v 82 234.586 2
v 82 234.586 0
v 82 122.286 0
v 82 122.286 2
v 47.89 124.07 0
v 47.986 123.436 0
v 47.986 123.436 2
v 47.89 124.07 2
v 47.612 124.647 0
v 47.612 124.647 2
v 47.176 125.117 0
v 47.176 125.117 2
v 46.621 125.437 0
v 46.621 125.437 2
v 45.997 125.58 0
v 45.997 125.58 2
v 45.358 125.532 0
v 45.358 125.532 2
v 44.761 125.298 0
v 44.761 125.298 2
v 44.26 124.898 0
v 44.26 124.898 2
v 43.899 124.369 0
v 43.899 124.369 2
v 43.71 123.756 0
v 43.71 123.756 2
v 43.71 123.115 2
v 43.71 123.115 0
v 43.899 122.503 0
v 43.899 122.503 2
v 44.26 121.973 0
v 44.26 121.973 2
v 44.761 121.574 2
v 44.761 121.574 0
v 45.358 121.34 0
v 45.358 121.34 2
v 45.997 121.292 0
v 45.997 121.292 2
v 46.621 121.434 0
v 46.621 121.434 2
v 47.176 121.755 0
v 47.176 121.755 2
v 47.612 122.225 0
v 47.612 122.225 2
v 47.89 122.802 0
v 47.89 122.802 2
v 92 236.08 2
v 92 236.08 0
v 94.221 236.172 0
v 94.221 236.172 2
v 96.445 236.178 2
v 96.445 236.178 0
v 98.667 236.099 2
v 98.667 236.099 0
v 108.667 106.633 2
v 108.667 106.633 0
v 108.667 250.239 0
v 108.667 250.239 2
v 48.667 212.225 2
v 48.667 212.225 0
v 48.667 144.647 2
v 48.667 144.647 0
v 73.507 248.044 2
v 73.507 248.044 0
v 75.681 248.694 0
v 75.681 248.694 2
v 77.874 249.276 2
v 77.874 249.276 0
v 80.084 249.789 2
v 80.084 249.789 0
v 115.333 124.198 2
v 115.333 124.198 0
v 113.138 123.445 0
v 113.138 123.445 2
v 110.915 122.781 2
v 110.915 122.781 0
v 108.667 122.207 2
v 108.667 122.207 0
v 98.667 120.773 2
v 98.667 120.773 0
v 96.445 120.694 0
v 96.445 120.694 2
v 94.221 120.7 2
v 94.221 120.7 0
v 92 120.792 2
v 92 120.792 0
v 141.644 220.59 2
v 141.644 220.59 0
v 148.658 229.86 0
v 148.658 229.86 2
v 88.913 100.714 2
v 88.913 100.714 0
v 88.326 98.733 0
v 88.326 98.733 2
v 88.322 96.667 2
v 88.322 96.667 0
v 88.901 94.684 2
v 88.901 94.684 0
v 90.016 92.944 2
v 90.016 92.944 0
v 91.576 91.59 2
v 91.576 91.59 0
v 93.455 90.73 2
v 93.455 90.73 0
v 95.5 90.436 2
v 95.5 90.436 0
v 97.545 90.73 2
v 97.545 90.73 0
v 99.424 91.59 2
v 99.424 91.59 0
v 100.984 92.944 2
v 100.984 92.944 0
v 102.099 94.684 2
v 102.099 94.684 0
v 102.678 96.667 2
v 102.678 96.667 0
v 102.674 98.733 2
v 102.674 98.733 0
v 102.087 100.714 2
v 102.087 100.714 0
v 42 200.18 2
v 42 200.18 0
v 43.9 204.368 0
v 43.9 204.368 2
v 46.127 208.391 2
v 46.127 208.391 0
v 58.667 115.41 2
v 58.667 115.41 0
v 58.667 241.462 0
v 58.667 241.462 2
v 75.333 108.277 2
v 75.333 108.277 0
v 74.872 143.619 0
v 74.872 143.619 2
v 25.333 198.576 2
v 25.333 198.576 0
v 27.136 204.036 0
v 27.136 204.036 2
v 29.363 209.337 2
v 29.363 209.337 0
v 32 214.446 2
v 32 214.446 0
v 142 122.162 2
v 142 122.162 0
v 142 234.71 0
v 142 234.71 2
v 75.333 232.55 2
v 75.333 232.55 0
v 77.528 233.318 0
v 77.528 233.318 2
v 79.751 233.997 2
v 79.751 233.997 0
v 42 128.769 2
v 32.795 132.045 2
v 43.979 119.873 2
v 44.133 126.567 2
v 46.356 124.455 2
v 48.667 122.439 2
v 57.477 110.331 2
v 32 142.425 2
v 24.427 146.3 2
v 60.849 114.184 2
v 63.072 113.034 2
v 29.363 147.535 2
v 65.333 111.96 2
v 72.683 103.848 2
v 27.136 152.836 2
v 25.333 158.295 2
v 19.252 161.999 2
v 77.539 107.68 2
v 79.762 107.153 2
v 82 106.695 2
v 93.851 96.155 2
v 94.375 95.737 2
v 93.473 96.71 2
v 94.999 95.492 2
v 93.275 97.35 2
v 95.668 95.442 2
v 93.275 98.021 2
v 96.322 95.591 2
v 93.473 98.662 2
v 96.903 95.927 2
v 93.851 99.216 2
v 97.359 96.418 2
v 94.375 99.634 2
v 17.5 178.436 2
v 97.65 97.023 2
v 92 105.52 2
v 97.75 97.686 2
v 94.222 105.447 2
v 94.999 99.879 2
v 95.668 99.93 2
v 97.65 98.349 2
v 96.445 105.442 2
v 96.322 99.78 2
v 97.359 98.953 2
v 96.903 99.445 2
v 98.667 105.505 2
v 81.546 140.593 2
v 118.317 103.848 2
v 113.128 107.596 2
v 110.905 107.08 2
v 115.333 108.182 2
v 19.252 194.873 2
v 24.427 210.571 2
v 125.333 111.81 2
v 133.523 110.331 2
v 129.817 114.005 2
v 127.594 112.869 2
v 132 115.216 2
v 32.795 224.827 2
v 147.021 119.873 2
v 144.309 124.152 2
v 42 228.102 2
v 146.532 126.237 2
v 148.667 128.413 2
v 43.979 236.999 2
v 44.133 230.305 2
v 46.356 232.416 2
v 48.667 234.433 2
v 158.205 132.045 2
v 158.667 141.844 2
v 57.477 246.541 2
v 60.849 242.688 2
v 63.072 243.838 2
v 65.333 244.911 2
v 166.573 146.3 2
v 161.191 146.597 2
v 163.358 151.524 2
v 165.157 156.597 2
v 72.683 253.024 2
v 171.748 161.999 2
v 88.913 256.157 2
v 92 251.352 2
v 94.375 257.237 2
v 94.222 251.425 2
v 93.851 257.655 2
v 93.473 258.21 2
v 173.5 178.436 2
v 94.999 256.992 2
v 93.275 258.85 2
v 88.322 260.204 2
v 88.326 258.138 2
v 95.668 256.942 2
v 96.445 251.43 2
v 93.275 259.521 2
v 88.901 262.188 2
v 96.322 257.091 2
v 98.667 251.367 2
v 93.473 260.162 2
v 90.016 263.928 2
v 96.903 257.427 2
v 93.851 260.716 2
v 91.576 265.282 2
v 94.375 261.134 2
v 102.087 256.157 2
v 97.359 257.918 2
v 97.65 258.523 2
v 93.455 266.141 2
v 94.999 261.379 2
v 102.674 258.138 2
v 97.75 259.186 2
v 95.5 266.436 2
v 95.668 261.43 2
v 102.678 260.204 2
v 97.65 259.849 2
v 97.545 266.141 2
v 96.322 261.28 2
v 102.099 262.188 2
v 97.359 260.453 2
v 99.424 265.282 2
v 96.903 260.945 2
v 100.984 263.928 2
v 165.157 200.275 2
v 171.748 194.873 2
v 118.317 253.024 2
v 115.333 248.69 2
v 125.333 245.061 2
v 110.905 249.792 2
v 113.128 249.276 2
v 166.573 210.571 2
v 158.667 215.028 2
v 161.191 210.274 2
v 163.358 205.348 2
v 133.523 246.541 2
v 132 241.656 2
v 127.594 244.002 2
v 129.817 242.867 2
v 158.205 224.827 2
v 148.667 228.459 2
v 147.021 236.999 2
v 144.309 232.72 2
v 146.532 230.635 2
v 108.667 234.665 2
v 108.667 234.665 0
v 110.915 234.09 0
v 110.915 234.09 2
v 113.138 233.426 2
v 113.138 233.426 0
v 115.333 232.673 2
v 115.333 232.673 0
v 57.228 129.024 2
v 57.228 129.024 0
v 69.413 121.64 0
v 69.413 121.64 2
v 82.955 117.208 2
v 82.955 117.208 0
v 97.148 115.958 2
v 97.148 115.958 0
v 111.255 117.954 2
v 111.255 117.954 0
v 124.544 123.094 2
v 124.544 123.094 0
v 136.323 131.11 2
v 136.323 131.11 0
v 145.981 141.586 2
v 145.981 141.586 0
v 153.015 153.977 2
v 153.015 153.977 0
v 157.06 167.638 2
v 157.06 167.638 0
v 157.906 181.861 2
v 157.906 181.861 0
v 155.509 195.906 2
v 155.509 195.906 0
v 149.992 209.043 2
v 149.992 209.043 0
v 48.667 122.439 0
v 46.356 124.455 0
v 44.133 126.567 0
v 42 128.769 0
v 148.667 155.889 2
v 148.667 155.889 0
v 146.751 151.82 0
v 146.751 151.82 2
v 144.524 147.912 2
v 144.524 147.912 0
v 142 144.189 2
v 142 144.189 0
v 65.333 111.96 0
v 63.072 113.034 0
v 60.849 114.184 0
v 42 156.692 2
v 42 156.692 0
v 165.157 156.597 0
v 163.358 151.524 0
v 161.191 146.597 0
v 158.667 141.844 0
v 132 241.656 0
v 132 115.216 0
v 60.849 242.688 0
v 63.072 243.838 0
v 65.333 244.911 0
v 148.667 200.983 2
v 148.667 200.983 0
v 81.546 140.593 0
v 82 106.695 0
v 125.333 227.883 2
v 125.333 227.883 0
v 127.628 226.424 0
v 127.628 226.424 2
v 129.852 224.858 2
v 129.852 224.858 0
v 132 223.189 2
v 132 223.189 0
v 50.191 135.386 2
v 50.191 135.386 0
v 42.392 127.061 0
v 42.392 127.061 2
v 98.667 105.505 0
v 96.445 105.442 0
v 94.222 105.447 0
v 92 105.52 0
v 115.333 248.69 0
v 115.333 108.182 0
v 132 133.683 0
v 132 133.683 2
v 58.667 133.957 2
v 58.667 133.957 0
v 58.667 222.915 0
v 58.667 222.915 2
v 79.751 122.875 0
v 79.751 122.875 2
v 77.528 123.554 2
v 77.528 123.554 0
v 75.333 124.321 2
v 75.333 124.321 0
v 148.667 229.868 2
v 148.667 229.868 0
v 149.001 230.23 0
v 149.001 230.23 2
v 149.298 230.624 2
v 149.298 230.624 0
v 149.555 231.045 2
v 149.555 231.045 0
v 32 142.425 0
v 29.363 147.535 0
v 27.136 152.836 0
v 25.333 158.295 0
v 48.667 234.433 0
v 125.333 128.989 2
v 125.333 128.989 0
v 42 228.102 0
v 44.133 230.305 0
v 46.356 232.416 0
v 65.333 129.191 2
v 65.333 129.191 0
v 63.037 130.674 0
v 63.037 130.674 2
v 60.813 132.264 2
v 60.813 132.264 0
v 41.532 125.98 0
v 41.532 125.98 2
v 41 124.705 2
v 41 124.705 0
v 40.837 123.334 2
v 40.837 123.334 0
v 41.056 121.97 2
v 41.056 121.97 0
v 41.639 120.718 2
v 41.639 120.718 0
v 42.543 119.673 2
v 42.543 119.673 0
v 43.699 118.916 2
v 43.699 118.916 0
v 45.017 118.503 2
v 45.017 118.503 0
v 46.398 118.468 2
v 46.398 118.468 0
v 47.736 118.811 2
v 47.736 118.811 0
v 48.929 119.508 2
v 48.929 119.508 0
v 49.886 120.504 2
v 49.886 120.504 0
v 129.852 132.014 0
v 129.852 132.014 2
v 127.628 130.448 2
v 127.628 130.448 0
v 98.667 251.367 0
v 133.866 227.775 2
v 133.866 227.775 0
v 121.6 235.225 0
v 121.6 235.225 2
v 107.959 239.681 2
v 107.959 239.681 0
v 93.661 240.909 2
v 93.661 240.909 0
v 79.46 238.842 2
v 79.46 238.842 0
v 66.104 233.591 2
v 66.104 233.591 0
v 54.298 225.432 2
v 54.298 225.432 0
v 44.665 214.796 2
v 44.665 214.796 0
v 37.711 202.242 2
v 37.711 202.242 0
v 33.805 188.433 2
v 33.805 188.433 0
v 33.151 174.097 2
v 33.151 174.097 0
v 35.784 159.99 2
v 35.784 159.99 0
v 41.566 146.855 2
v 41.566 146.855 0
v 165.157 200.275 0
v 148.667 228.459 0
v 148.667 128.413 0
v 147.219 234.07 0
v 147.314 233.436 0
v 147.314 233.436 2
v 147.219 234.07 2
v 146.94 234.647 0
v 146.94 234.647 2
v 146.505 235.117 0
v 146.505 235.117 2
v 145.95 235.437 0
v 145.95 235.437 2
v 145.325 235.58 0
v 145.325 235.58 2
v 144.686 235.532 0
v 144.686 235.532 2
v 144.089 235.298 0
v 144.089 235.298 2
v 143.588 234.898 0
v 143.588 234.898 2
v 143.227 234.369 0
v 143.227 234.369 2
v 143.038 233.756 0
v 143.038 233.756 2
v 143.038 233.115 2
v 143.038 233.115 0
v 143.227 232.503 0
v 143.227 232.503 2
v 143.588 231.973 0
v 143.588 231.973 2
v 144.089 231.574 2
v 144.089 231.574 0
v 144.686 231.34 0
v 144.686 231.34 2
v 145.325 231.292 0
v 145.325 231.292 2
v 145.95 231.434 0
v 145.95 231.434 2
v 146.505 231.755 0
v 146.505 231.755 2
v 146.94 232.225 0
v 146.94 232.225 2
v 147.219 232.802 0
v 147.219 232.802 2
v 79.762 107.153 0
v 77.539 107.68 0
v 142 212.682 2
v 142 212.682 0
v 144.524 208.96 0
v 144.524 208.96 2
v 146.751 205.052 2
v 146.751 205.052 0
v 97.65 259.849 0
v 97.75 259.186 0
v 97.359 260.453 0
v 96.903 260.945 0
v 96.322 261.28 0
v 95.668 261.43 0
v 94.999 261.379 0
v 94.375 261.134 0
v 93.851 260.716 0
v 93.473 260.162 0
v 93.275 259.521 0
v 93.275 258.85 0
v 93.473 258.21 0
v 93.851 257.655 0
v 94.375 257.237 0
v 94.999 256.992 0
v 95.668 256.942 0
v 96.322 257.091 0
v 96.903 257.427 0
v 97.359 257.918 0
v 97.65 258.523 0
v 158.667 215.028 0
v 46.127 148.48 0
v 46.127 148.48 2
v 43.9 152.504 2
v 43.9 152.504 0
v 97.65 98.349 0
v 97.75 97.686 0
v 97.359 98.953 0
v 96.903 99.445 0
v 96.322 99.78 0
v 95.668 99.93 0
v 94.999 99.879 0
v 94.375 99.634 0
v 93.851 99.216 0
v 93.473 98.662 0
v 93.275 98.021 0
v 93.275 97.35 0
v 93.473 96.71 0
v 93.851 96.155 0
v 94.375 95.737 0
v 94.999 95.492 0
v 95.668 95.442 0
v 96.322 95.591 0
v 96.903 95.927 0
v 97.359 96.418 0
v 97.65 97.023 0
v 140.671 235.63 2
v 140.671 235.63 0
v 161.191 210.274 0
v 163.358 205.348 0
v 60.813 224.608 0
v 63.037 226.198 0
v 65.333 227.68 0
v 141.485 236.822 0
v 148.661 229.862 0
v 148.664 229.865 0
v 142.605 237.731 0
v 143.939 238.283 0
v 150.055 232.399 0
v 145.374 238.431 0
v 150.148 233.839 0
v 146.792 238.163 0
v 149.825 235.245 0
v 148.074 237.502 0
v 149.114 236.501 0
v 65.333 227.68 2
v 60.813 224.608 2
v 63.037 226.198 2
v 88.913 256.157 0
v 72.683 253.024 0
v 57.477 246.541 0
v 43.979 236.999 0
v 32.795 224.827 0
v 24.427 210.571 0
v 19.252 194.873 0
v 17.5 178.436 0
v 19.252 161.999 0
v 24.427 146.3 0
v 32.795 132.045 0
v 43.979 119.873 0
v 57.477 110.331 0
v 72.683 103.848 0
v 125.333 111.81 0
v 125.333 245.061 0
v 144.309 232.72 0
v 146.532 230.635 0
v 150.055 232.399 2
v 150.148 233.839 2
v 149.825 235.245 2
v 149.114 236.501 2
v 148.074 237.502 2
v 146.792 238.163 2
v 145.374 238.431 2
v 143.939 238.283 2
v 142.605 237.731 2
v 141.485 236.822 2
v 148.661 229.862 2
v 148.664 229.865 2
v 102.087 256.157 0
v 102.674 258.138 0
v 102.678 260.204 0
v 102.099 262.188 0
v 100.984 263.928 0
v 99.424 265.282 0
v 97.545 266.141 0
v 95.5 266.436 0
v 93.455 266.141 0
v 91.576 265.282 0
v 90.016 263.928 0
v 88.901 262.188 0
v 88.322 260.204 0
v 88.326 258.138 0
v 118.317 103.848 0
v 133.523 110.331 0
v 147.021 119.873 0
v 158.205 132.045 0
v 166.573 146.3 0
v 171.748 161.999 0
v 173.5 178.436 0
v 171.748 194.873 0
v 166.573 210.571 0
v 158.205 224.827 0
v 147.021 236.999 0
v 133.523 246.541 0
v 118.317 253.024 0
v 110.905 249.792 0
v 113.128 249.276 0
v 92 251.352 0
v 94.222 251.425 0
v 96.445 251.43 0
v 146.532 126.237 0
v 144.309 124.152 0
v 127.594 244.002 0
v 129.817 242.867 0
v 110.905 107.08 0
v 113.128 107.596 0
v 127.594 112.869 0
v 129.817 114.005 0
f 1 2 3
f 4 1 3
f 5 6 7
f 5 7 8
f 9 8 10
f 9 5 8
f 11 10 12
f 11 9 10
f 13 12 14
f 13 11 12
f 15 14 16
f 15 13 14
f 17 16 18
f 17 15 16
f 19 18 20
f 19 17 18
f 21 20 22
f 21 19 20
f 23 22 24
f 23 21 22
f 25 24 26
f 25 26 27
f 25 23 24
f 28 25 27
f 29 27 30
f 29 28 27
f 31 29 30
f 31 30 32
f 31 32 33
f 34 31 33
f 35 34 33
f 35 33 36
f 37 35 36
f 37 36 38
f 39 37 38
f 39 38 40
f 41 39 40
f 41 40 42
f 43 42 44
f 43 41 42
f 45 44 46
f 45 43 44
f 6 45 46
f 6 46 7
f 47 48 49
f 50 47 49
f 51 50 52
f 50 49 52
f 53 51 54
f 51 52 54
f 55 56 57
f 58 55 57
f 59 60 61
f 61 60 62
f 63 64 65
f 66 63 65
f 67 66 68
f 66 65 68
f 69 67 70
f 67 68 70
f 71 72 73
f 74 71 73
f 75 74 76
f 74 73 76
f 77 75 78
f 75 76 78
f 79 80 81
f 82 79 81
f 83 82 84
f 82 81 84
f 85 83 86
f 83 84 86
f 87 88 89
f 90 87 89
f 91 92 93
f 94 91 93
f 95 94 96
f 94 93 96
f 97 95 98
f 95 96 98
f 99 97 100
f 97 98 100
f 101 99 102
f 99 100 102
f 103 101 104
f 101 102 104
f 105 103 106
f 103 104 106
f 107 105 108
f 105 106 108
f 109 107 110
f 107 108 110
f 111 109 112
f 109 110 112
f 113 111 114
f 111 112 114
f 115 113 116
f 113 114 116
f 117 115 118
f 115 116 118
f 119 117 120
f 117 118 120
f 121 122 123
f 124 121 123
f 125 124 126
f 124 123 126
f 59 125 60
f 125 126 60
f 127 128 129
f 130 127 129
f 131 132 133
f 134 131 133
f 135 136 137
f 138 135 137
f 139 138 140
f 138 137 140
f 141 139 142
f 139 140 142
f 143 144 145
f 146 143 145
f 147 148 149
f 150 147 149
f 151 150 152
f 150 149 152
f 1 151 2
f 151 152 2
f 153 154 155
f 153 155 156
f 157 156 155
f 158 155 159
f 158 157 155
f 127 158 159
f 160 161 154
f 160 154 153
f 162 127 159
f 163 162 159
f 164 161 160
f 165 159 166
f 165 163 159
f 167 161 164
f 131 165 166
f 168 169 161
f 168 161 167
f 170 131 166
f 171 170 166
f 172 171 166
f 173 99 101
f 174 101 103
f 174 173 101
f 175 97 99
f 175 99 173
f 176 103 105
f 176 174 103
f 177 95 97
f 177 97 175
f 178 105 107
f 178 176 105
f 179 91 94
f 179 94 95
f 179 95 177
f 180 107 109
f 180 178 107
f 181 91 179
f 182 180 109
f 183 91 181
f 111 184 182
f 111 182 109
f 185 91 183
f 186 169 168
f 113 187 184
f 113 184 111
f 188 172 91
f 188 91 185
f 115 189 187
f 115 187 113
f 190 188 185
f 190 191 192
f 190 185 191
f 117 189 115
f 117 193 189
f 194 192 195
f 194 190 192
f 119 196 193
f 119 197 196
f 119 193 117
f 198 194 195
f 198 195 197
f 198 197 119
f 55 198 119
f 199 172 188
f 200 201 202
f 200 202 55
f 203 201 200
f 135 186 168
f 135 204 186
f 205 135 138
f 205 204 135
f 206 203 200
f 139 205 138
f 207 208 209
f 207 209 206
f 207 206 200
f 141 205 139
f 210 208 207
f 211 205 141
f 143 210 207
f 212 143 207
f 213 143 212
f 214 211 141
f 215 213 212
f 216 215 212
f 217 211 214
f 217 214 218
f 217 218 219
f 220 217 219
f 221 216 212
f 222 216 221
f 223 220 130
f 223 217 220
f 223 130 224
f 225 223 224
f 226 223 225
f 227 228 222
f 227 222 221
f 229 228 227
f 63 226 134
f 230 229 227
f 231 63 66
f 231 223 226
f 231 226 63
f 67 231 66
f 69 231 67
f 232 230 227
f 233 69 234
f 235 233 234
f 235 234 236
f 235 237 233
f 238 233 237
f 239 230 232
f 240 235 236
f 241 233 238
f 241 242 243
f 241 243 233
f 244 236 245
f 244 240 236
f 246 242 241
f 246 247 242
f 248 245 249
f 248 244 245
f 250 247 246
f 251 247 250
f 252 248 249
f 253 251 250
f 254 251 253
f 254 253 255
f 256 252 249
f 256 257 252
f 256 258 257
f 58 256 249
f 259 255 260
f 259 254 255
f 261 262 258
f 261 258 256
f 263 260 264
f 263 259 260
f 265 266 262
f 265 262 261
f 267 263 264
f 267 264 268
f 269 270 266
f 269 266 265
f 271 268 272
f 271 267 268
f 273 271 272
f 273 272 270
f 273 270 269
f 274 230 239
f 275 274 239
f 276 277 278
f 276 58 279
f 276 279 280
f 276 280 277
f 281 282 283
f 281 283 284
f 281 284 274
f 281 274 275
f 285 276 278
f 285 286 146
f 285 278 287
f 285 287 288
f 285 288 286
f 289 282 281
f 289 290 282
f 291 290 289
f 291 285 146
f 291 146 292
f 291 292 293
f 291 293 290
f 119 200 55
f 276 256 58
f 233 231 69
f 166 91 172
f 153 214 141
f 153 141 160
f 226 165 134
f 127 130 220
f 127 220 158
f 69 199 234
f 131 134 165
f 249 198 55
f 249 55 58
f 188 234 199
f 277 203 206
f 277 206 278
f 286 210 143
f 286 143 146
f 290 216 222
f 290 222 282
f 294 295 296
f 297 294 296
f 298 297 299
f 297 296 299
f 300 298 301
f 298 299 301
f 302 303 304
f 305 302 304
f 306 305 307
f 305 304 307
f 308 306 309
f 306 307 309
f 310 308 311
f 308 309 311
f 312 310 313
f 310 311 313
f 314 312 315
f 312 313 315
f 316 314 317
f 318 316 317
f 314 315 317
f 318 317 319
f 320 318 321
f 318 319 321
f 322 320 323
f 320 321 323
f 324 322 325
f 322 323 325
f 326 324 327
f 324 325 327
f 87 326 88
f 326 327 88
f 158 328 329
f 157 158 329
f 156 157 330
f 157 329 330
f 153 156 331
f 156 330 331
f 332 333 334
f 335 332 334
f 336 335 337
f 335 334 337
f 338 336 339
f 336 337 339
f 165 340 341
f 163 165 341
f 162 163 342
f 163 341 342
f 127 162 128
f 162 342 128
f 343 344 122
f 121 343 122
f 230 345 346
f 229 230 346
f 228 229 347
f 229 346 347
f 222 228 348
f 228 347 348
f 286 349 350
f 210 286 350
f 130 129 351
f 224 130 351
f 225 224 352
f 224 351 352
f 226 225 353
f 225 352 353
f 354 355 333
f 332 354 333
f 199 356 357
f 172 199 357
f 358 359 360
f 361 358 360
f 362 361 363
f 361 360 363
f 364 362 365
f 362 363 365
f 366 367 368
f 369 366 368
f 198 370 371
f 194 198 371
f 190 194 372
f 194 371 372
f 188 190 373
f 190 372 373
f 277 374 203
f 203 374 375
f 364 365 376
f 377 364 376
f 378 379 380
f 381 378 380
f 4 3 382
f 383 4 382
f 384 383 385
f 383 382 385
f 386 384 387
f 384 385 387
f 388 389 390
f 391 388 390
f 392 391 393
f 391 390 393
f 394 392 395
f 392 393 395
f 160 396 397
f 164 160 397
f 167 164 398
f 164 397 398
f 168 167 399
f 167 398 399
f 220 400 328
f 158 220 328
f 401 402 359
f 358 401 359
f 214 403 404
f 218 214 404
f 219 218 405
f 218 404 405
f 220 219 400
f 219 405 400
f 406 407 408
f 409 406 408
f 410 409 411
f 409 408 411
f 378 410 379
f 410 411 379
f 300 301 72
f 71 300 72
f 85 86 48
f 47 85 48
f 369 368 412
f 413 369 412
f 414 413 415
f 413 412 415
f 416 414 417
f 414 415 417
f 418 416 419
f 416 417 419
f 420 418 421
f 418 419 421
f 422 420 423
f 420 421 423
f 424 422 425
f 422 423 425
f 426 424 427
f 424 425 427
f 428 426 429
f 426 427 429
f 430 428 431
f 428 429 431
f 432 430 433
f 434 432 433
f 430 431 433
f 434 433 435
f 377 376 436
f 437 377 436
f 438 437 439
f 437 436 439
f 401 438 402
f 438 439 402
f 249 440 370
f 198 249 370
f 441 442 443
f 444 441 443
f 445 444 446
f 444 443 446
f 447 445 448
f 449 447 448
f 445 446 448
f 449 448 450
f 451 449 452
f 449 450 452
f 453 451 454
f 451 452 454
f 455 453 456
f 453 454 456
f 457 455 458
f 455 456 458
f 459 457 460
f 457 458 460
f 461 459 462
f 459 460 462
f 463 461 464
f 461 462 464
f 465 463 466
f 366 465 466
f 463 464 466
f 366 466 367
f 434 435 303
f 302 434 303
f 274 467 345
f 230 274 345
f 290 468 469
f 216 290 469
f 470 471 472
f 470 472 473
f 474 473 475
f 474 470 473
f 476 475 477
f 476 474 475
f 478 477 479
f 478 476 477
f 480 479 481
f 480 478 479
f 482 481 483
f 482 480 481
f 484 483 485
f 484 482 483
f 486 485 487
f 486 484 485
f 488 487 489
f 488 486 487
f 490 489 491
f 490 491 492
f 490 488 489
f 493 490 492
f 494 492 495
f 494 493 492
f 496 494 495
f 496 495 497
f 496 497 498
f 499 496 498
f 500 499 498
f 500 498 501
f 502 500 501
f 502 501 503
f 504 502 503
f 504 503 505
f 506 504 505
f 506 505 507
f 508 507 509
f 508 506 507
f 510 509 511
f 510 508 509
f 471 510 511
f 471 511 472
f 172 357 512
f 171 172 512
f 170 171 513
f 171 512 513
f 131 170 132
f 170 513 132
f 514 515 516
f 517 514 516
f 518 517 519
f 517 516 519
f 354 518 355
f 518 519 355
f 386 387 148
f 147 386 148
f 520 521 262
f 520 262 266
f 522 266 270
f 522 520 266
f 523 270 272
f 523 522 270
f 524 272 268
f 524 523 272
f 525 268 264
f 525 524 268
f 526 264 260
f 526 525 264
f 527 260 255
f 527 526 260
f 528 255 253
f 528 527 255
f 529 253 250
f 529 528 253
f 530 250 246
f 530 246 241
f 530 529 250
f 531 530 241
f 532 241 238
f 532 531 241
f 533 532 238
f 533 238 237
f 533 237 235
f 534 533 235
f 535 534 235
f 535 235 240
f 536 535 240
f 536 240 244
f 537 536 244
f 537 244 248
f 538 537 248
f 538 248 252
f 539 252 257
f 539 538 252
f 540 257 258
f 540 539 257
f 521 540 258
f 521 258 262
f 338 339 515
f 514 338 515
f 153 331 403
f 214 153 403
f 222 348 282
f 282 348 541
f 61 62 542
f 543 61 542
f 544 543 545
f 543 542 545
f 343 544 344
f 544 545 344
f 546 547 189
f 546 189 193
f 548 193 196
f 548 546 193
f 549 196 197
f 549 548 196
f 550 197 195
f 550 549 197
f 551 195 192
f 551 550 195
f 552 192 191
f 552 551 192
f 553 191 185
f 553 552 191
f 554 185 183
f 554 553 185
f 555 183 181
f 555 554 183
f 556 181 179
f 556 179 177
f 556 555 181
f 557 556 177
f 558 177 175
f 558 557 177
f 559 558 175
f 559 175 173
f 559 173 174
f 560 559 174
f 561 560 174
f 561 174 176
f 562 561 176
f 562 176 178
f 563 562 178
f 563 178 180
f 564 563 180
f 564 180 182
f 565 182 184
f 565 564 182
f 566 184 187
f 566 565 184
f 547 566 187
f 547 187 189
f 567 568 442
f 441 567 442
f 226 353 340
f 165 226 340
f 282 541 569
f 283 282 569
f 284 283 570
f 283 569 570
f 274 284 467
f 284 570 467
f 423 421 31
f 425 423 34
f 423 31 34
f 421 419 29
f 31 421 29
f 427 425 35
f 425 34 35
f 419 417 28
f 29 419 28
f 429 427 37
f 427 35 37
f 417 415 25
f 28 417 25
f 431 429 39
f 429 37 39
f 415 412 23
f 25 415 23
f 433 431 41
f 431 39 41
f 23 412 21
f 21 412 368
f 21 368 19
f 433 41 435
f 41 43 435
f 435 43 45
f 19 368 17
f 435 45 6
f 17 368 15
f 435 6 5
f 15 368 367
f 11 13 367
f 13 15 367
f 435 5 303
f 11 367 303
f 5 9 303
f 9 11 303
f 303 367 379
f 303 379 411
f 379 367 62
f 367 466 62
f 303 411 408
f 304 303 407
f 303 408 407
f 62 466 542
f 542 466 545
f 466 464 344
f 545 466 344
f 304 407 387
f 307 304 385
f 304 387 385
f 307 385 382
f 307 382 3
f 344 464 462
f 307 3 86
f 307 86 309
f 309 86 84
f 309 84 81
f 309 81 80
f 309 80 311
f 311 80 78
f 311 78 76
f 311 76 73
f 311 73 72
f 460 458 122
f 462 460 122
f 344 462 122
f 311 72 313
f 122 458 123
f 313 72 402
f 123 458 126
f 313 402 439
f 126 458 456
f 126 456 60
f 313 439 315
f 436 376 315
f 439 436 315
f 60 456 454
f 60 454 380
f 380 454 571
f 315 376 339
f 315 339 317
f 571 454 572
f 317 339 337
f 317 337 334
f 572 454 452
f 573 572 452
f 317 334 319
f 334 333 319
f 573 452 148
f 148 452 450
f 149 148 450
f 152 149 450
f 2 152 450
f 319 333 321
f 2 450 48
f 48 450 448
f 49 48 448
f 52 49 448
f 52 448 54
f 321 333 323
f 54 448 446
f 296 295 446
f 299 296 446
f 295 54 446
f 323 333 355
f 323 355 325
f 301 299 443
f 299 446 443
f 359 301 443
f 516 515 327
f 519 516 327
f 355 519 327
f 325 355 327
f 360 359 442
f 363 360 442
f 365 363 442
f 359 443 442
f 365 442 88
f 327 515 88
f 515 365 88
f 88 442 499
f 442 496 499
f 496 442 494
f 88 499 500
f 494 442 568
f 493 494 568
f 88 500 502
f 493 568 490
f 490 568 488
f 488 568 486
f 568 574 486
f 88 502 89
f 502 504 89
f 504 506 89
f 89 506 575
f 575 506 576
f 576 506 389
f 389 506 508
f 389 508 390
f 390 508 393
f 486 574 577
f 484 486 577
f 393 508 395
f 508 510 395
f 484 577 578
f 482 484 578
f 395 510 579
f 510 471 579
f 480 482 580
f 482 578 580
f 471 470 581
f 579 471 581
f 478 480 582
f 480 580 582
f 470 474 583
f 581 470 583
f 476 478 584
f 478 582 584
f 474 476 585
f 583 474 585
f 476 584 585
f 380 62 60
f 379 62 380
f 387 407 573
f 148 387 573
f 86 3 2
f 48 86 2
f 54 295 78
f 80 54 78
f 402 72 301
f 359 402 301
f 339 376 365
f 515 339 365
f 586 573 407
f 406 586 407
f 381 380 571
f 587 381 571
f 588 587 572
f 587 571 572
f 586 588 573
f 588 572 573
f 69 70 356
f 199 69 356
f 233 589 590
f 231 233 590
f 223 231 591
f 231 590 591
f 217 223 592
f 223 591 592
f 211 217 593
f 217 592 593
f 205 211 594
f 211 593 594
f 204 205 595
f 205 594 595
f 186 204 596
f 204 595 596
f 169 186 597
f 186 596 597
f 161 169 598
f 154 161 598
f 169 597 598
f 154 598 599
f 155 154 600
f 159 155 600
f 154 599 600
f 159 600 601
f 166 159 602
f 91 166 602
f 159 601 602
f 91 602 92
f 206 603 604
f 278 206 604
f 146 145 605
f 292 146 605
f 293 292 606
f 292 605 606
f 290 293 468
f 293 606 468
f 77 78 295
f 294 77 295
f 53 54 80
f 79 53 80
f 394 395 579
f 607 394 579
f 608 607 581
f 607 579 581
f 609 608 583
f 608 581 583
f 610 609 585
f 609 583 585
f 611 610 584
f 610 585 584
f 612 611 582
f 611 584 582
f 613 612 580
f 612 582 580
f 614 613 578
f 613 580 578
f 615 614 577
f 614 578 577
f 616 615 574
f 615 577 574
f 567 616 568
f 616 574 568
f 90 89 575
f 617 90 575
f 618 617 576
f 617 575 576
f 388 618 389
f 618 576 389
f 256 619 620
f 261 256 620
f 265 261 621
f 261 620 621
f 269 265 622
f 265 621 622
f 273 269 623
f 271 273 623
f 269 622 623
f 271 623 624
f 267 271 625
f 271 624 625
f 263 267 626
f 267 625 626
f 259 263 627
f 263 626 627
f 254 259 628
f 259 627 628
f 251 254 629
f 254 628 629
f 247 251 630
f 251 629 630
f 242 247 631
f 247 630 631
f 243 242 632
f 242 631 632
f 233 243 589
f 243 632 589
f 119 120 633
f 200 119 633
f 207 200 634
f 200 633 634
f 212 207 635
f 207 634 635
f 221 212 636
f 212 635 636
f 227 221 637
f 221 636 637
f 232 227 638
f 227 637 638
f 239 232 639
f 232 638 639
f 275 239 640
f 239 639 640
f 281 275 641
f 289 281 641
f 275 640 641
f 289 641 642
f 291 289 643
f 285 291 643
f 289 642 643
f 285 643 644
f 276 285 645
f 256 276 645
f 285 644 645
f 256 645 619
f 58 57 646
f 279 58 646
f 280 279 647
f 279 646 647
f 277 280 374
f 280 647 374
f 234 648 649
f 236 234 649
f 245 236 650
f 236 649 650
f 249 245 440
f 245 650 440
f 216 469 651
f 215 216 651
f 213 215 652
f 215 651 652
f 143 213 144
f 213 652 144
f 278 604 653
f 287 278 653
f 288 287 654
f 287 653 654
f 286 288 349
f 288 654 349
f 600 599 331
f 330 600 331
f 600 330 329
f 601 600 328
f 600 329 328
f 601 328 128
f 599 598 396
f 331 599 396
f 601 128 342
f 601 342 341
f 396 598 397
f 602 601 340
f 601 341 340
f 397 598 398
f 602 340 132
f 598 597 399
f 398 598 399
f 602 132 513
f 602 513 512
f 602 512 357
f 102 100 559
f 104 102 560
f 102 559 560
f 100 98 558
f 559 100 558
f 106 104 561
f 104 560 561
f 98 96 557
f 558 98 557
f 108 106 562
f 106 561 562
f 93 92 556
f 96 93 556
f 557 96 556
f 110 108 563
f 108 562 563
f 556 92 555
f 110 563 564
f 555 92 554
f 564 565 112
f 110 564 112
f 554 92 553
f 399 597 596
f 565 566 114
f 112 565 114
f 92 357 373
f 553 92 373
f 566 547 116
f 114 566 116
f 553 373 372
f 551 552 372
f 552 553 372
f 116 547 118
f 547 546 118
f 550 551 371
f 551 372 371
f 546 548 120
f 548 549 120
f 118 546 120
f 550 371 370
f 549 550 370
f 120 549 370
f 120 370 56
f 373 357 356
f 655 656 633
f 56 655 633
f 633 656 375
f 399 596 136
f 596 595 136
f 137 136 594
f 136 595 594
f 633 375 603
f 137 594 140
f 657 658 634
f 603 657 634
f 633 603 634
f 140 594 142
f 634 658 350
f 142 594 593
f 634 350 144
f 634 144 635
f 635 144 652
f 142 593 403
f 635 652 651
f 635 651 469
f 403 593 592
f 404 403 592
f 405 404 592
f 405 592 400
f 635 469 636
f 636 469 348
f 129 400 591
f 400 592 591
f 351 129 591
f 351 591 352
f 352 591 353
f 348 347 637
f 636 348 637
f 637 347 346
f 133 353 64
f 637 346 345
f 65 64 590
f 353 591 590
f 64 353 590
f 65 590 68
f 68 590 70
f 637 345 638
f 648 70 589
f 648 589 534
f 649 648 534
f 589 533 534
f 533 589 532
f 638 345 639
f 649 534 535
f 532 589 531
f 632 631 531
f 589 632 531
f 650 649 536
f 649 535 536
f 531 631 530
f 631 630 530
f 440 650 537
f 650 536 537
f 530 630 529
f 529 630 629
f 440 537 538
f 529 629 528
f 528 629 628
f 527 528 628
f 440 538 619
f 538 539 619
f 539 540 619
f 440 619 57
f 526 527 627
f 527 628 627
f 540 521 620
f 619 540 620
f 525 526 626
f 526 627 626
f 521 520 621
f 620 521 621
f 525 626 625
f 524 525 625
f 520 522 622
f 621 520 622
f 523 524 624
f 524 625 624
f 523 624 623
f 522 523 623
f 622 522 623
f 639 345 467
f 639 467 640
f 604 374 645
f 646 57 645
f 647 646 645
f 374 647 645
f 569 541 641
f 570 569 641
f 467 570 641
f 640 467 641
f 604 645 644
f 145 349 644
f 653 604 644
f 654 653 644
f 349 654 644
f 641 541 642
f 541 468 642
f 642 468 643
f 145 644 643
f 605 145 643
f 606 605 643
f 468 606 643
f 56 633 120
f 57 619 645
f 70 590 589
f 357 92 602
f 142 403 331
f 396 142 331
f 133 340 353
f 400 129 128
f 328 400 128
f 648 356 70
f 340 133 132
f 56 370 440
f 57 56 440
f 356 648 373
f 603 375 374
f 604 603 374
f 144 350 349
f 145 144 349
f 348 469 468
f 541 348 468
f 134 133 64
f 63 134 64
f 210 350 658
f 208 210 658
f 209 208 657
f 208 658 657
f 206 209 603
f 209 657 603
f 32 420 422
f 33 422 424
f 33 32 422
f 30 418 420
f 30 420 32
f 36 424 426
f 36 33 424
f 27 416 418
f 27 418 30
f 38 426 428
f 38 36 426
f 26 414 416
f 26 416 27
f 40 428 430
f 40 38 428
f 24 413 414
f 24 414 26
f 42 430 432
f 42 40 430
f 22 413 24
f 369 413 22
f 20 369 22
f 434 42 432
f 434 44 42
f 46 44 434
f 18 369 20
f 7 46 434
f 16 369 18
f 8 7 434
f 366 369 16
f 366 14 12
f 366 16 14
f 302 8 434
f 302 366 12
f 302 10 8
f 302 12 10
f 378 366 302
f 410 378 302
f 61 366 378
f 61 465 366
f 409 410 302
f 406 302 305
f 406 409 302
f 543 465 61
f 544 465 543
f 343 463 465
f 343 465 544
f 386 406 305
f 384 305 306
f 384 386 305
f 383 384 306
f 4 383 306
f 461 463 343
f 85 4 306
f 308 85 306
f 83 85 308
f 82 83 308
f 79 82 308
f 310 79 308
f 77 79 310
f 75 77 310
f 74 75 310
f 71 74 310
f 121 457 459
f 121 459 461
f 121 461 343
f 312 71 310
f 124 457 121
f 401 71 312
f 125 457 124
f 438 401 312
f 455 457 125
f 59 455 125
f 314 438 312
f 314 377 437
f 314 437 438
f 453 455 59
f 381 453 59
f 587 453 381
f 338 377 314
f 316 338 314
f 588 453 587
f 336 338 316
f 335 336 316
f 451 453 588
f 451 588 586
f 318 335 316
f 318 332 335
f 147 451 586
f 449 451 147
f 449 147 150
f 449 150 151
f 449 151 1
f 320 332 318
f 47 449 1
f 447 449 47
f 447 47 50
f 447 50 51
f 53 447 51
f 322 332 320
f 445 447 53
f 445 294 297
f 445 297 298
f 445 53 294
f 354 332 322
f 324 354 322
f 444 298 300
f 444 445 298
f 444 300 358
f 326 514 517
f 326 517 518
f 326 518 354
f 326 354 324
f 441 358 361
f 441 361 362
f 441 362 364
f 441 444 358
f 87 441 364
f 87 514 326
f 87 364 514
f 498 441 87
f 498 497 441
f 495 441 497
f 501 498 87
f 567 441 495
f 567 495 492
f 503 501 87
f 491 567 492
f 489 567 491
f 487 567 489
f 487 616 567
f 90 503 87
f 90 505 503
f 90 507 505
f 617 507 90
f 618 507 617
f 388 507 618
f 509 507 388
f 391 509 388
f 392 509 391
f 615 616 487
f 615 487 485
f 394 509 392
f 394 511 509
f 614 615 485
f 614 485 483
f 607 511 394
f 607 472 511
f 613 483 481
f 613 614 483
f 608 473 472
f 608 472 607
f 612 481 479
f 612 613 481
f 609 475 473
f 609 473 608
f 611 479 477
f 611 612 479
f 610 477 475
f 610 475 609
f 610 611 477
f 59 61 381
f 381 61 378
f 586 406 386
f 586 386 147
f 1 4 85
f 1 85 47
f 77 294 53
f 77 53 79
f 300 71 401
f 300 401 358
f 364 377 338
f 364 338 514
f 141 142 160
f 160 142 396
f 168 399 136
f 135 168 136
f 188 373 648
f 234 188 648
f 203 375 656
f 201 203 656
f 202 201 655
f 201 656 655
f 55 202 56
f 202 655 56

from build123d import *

# Parameters (mm, degrees)
F2_R     = 2.25
F3_DEPTH = 2
F4_R     = 2.15
F5_DEPTH = 2


with BuildPart() as f3:
    # F2 (on Top) → F3 (new body)
    with BuildSketch(Plane.XY):
        with BuildLine():
            ThreePointArc((88.912903, 100.714455), (95.5, 90.435818), (102.087097, 100.714455))
            ThreePointArc((102.087097, 100.714455), (173.5, 178.435818), (102.087097, 256.15718))
            ThreePointArc((102.087097, 256.15718), (95.5, 266.435818), (88.912903, 256.15718))
            ThreePointArc((88.912903, 256.15718), (17.5, 178.435818), (88.912903, 100.714455))
        make_face()
        with Locations((95.5, 97.685818)):
            Circle(F2_R, mode=Mode.SUBTRACT)
        with BuildLine():
            ThreePointArc((48.66664, 122.439064), (45.233552, 125.499212), (41.99997, 128.769463))
            Line((41.99997, 128.769463), (41.99997, 228.102172))
            ThreePointArc((41.99997, 228.102172), (45.233552, 231.372423), (48.66664, 234.432571))
            Line((48.66664, 234.432571), (48.66664, 122.439064))
        make_face(mode=Mode.SUBTRACT)
        with BuildLine():
            ThreePointArc((73.50733, 248.044168), (76.775145, 248.993452), (80.083648, 249.789416))
            Line((80.083648, 249.789416), (81.546021, 140.592554))
            Line((81.546021, 140.592554), (81.99998, 106.694968))
            ThreePointArc((81.99998, 106.694968), (78.648077, 107.407565), (75.33331, 108.27668))
            Line((75.33331, 108.27668), (74.871582, 143.61913))
            Line((74.871582, 143.61913), (73.50733, 248.044168))
        make_face(mode=Mode.SUBTRACT)
        with BuildLine():
            ThreePointArc((31.99997, 142.425455), (28.19723, 150.163267), (25.3333, 158.295455))
            Line((25.3333, 158.295455), (25.3333, 198.57618))
            ThreePointArc((25.3333, 198.57618), (28.19723, 206.708368), (31.99997, 214.44618))
            Line((31.99997, 214.44618), (31.99997, 142.425455))
        make_face(mode=Mode.SUBTRACT)
        with BuildLine():
            ThreePointArc((65.33331, 111.960478), (61.955615, 113.599298), (58.66664, 115.409604))
            Line((58.66664, 115.409604), (58.66664, 194.034009))
            Line((58.66664, 194.034009), (58.66664, 241.462031))
            ThreePointArc((58.66664, 241.462031), (61.955615, 243.272337), (65.33331, 244.911157))
            Line((65.33331, 244.911157), (65.33331, 204.703113))
            Line((65.33331, 204.703113), (65.33331, 111.960478))
        make_face(mode=Mode.SUBTRACT)
        with BuildLine():
            ThreePointArc((98.66665, 105.504533), (95.333141, 105.436008), (91.99998, 105.519771))
            Line((91.99998, 105.519771), (91.99998, 138.589238))
            Line((91.99998, 138.589238), (91.99998, 251.351864))
            ThreePointArc((91.99998, 251.351864), (95.333141, 251.435627), (98.66665, 251.367102))
            Line((98.66665, 251.367102), (98.66665, 138.56136))
            Line((98.66665, 138.56136), (98.66665, 105.504533))
        make_face(mode=Mode.SUBTRACT)
        with Locations((95.5, 259.185818)):
            Circle(F2_R, mode=Mode.SUBTRACT)
        with BuildLine():
            ThreePointArc((115.33332, 108.181711), (112.018145, 107.329201), (108.66665, 106.633037))
            Line((108.66665, 106.633037), (108.66665, 140.664938))
            Line((108.66665, 140.664938), (108.66665, 250.238598))
            ThreePointArc((108.66665, 250.238598), (112.018145, 249.542434), (115.33332, 248.689924))
            Line((115.33332, 248.689924), (115.33332, 143.699102))
            Line((115.33332, 143.699102), (115.33332, 108.181711))
        make_face(mode=Mode.SUBTRACT)
        with BuildLine():
            ThreePointArc((131.99999, 115.215957), (128.710342, 113.427563), (125.33332, 111.810199))
            Line((125.33332, 111.810199), (125.33332, 151.790499))
            Line((125.33332, 151.790499), (125.33332, 245.061436))
            ThreePointArc((125.33332, 245.061436), (128.710342, 243.444072), (131.99999, 241.655678))
            Line((131.99999, 241.655678), (131.99999, 162.072727))
            Line((131.99999, 162.072727), (131.99999, 115.215957))
        make_face(mode=Mode.SUBTRACT)
        with BuildLine():
            ThreePointArc((148.66666, 128.41276), (145.431238, 125.182916), (141.99999, 122.161925))
            Line((141.99999, 122.161925), (141.99999, 234.70971))
            ThreePointArc((141.99999, 234.70971), (145.431238, 231.688719), (148.66666, 228.458875))
            Line((148.66666, 228.458875), (148.66666, 128.41276))
        make_face(mode=Mode.SUBTRACT)
        with BuildLine():
            ThreePointArc((165.156669, 156.596667), (162.320062, 149.040591), (158.66666, 141.843837))
            Line((158.66666, 141.843837), (158.66666, 215.027798))
            ThreePointArc((158.66666, 215.027798), (162.320062, 207.831044), (165.156669, 200.274968))
            Line((165.156669, 200.274968), (165.156669, 156.596667))
        make_face(mode=Mode.SUBTRACT)
    extrude(amount=F3_DEPTH)


with BuildPart() as f5:
    # F4 (on Top) → F5 (new body)
    with BuildSketch(Plane.XY):
        with BuildLine():
            Line((49.886084, 120.503883), (57.227956, 129.024274))
            ThreePointArc((57.227956, 129.024274), (141.451654, 136.071971), (141.644244, 220.589806))
            ThreePointArc((141.644244, 220.589806), (137.907377, 224.347302), (133.865632, 227.77473))
            ThreePointArc((133.865632, 227.77473), (49.175219, 220.391325), (50.190611, 135.385738))
            Line((50.190611, 135.385738), (42.392399, 127.061022))
            ThreePointArc((42.392399, 127.061022), (42.543359, 119.672975), (49.886084, 120.503883))
        make_face()
        with Locations((45.835928, 123.435818)):
            Circle(F4_R, mode=Mode.SUBTRACT)
        with BuildLine():
            Line((48.66664, 212.224853), (48.66664, 144.646782))
            ThreePointArc((48.66664, 144.646782), (44.973107, 150.469846), (41.99997, 156.691639))
            Line((41.99997, 156.691639), (41.99997, 200.179996))
            ThreePointArc((41.99997, 200.179996), (44.973107, 206.401789), (48.66664, 212.224853))
        make_face(mode=Mode.SUBTRACT)
        with BuildLine():
            Line((65.33331, 227.680445), (65.33331, 129.19119))
            ThreePointArc((65.33331, 129.19119), (61.915333, 131.455688), (58.66664, 133.95699))
            Line((58.66664, 133.95699), (58.66664, 222.914645))
            ThreePointArc((58.66664, 222.914645), (61.915333, 225.415947), (65.33331, 227.680445))
        make_face(mode=Mode.SUBTRACT)
        with BuildLine():
            Line((81.99998, 234.585724), (81.99998, 122.285911))
            ThreePointArc((81.99998, 122.285911), (78.635906, 123.202994), (75.33331, 124.321428))
            Line((75.33331, 124.321428), (75.33331, 232.550207))
            ThreePointArc((75.33331, 232.550207), (78.635906, 233.668641), (81.99998, 234.585724))
        make_face(mode=Mode.SUBTRACT)
        with BuildLine():
            Line((98.66665, 236.098932), (98.66665, 120.772703))
            ThreePointArc((98.66665, 120.772703), (95.333037, 120.686059), (91.99998, 120.791977))
            Line((91.99998, 120.791977), (91.99998, 236.079658))
            ThreePointArc((91.99998, 236.079658), (95.333037, 236.185576), (98.66665, 236.098932))
        make_face(mode=Mode.SUBTRACT)
        with BuildLine():
            Line((108.66665, 122.206805), (108.66665, 234.66483))
            ThreePointArc((108.66665, 234.66483), (112.030005, 233.769545), (115.33332, 232.673276))
            Line((115.33332, 232.673276), (115.33332, 124.198359))
            ThreePointArc((115.33332, 124.198359), (112.030005, 123.10209), (108.66665, 122.206805))
        make_face(mode=Mode.SUBTRACT)
        with BuildLine():
            Line((125.33332, 128.988517), (125.33332, 227.883118))
            ThreePointArc((125.33332, 227.883118), (128.74961, 225.653673), (131.99999, 223.188619))
            Line((131.99999, 223.188619), (131.99999, 133.683016))
            ThreePointArc((131.99999, 133.683016), (128.74961, 131.217962), (125.33332, 128.988517))
        make_face(mode=Mode.SUBTRACT)
        with BuildLine():
            Line((148.66666, 200.982852), (148.66666, 155.888783))
            ThreePointArc((148.66666, 155.888783), (145.675481, 149.844147), (141.99999, 144.189454))
            Line((141.99999, 144.189454), (141.99999, 212.682181))
            ThreePointArc((141.99999, 212.682181), (145.675481, 207.027488), (148.66666, 200.982852))
        make_face(mode=Mode.SUBTRACT)
        with BuildLine():
            ThreePointArc((133.865632, 227.77473), (137.907377, 224.347302), (141.644244, 220.589806))
            Line((141.644244, 220.589806), (148.658463, 229.859615))
            Line((148.658463, 229.859615), (148.66666, 229.870447))
            Line((148.66666, 229.870447), (149.555458, 231.04506))
            ThreePointArc((149.555458, 231.04506), (147.457108, 237.879013), (140.671242, 235.630011))
            Line((140.671242, 235.630011), (133.865632, 227.77473))
        make_face()
        with Locations((145.164072, 233.435818)):
            Circle(F4_R, mode=Mode.SUBTRACT)
        with BuildLine():
            Line((148.66666, 229.870447), (148.658463, 229.859615))
            ThreePointArc((148.658463, 229.859615), (148.662564, 229.863626), (148.66666, 229.867642))
            Line((148.66666, 229.867642), (148.66666, 229.870447))
        make_face()
        with BuildLine():
            Line((148.66666, 229.870447), (148.66666, 229.867642))
            ThreePointArc((148.66666, 229.867642), (149.154722, 230.423392), (149.555458, 231.04506))
            Line((149.555458, 231.04506), (148.66666, 229.870447))
        make_face()
    extrude(amount=F5_DEPTH)


solid = Compound([f3.part, f5.part])
